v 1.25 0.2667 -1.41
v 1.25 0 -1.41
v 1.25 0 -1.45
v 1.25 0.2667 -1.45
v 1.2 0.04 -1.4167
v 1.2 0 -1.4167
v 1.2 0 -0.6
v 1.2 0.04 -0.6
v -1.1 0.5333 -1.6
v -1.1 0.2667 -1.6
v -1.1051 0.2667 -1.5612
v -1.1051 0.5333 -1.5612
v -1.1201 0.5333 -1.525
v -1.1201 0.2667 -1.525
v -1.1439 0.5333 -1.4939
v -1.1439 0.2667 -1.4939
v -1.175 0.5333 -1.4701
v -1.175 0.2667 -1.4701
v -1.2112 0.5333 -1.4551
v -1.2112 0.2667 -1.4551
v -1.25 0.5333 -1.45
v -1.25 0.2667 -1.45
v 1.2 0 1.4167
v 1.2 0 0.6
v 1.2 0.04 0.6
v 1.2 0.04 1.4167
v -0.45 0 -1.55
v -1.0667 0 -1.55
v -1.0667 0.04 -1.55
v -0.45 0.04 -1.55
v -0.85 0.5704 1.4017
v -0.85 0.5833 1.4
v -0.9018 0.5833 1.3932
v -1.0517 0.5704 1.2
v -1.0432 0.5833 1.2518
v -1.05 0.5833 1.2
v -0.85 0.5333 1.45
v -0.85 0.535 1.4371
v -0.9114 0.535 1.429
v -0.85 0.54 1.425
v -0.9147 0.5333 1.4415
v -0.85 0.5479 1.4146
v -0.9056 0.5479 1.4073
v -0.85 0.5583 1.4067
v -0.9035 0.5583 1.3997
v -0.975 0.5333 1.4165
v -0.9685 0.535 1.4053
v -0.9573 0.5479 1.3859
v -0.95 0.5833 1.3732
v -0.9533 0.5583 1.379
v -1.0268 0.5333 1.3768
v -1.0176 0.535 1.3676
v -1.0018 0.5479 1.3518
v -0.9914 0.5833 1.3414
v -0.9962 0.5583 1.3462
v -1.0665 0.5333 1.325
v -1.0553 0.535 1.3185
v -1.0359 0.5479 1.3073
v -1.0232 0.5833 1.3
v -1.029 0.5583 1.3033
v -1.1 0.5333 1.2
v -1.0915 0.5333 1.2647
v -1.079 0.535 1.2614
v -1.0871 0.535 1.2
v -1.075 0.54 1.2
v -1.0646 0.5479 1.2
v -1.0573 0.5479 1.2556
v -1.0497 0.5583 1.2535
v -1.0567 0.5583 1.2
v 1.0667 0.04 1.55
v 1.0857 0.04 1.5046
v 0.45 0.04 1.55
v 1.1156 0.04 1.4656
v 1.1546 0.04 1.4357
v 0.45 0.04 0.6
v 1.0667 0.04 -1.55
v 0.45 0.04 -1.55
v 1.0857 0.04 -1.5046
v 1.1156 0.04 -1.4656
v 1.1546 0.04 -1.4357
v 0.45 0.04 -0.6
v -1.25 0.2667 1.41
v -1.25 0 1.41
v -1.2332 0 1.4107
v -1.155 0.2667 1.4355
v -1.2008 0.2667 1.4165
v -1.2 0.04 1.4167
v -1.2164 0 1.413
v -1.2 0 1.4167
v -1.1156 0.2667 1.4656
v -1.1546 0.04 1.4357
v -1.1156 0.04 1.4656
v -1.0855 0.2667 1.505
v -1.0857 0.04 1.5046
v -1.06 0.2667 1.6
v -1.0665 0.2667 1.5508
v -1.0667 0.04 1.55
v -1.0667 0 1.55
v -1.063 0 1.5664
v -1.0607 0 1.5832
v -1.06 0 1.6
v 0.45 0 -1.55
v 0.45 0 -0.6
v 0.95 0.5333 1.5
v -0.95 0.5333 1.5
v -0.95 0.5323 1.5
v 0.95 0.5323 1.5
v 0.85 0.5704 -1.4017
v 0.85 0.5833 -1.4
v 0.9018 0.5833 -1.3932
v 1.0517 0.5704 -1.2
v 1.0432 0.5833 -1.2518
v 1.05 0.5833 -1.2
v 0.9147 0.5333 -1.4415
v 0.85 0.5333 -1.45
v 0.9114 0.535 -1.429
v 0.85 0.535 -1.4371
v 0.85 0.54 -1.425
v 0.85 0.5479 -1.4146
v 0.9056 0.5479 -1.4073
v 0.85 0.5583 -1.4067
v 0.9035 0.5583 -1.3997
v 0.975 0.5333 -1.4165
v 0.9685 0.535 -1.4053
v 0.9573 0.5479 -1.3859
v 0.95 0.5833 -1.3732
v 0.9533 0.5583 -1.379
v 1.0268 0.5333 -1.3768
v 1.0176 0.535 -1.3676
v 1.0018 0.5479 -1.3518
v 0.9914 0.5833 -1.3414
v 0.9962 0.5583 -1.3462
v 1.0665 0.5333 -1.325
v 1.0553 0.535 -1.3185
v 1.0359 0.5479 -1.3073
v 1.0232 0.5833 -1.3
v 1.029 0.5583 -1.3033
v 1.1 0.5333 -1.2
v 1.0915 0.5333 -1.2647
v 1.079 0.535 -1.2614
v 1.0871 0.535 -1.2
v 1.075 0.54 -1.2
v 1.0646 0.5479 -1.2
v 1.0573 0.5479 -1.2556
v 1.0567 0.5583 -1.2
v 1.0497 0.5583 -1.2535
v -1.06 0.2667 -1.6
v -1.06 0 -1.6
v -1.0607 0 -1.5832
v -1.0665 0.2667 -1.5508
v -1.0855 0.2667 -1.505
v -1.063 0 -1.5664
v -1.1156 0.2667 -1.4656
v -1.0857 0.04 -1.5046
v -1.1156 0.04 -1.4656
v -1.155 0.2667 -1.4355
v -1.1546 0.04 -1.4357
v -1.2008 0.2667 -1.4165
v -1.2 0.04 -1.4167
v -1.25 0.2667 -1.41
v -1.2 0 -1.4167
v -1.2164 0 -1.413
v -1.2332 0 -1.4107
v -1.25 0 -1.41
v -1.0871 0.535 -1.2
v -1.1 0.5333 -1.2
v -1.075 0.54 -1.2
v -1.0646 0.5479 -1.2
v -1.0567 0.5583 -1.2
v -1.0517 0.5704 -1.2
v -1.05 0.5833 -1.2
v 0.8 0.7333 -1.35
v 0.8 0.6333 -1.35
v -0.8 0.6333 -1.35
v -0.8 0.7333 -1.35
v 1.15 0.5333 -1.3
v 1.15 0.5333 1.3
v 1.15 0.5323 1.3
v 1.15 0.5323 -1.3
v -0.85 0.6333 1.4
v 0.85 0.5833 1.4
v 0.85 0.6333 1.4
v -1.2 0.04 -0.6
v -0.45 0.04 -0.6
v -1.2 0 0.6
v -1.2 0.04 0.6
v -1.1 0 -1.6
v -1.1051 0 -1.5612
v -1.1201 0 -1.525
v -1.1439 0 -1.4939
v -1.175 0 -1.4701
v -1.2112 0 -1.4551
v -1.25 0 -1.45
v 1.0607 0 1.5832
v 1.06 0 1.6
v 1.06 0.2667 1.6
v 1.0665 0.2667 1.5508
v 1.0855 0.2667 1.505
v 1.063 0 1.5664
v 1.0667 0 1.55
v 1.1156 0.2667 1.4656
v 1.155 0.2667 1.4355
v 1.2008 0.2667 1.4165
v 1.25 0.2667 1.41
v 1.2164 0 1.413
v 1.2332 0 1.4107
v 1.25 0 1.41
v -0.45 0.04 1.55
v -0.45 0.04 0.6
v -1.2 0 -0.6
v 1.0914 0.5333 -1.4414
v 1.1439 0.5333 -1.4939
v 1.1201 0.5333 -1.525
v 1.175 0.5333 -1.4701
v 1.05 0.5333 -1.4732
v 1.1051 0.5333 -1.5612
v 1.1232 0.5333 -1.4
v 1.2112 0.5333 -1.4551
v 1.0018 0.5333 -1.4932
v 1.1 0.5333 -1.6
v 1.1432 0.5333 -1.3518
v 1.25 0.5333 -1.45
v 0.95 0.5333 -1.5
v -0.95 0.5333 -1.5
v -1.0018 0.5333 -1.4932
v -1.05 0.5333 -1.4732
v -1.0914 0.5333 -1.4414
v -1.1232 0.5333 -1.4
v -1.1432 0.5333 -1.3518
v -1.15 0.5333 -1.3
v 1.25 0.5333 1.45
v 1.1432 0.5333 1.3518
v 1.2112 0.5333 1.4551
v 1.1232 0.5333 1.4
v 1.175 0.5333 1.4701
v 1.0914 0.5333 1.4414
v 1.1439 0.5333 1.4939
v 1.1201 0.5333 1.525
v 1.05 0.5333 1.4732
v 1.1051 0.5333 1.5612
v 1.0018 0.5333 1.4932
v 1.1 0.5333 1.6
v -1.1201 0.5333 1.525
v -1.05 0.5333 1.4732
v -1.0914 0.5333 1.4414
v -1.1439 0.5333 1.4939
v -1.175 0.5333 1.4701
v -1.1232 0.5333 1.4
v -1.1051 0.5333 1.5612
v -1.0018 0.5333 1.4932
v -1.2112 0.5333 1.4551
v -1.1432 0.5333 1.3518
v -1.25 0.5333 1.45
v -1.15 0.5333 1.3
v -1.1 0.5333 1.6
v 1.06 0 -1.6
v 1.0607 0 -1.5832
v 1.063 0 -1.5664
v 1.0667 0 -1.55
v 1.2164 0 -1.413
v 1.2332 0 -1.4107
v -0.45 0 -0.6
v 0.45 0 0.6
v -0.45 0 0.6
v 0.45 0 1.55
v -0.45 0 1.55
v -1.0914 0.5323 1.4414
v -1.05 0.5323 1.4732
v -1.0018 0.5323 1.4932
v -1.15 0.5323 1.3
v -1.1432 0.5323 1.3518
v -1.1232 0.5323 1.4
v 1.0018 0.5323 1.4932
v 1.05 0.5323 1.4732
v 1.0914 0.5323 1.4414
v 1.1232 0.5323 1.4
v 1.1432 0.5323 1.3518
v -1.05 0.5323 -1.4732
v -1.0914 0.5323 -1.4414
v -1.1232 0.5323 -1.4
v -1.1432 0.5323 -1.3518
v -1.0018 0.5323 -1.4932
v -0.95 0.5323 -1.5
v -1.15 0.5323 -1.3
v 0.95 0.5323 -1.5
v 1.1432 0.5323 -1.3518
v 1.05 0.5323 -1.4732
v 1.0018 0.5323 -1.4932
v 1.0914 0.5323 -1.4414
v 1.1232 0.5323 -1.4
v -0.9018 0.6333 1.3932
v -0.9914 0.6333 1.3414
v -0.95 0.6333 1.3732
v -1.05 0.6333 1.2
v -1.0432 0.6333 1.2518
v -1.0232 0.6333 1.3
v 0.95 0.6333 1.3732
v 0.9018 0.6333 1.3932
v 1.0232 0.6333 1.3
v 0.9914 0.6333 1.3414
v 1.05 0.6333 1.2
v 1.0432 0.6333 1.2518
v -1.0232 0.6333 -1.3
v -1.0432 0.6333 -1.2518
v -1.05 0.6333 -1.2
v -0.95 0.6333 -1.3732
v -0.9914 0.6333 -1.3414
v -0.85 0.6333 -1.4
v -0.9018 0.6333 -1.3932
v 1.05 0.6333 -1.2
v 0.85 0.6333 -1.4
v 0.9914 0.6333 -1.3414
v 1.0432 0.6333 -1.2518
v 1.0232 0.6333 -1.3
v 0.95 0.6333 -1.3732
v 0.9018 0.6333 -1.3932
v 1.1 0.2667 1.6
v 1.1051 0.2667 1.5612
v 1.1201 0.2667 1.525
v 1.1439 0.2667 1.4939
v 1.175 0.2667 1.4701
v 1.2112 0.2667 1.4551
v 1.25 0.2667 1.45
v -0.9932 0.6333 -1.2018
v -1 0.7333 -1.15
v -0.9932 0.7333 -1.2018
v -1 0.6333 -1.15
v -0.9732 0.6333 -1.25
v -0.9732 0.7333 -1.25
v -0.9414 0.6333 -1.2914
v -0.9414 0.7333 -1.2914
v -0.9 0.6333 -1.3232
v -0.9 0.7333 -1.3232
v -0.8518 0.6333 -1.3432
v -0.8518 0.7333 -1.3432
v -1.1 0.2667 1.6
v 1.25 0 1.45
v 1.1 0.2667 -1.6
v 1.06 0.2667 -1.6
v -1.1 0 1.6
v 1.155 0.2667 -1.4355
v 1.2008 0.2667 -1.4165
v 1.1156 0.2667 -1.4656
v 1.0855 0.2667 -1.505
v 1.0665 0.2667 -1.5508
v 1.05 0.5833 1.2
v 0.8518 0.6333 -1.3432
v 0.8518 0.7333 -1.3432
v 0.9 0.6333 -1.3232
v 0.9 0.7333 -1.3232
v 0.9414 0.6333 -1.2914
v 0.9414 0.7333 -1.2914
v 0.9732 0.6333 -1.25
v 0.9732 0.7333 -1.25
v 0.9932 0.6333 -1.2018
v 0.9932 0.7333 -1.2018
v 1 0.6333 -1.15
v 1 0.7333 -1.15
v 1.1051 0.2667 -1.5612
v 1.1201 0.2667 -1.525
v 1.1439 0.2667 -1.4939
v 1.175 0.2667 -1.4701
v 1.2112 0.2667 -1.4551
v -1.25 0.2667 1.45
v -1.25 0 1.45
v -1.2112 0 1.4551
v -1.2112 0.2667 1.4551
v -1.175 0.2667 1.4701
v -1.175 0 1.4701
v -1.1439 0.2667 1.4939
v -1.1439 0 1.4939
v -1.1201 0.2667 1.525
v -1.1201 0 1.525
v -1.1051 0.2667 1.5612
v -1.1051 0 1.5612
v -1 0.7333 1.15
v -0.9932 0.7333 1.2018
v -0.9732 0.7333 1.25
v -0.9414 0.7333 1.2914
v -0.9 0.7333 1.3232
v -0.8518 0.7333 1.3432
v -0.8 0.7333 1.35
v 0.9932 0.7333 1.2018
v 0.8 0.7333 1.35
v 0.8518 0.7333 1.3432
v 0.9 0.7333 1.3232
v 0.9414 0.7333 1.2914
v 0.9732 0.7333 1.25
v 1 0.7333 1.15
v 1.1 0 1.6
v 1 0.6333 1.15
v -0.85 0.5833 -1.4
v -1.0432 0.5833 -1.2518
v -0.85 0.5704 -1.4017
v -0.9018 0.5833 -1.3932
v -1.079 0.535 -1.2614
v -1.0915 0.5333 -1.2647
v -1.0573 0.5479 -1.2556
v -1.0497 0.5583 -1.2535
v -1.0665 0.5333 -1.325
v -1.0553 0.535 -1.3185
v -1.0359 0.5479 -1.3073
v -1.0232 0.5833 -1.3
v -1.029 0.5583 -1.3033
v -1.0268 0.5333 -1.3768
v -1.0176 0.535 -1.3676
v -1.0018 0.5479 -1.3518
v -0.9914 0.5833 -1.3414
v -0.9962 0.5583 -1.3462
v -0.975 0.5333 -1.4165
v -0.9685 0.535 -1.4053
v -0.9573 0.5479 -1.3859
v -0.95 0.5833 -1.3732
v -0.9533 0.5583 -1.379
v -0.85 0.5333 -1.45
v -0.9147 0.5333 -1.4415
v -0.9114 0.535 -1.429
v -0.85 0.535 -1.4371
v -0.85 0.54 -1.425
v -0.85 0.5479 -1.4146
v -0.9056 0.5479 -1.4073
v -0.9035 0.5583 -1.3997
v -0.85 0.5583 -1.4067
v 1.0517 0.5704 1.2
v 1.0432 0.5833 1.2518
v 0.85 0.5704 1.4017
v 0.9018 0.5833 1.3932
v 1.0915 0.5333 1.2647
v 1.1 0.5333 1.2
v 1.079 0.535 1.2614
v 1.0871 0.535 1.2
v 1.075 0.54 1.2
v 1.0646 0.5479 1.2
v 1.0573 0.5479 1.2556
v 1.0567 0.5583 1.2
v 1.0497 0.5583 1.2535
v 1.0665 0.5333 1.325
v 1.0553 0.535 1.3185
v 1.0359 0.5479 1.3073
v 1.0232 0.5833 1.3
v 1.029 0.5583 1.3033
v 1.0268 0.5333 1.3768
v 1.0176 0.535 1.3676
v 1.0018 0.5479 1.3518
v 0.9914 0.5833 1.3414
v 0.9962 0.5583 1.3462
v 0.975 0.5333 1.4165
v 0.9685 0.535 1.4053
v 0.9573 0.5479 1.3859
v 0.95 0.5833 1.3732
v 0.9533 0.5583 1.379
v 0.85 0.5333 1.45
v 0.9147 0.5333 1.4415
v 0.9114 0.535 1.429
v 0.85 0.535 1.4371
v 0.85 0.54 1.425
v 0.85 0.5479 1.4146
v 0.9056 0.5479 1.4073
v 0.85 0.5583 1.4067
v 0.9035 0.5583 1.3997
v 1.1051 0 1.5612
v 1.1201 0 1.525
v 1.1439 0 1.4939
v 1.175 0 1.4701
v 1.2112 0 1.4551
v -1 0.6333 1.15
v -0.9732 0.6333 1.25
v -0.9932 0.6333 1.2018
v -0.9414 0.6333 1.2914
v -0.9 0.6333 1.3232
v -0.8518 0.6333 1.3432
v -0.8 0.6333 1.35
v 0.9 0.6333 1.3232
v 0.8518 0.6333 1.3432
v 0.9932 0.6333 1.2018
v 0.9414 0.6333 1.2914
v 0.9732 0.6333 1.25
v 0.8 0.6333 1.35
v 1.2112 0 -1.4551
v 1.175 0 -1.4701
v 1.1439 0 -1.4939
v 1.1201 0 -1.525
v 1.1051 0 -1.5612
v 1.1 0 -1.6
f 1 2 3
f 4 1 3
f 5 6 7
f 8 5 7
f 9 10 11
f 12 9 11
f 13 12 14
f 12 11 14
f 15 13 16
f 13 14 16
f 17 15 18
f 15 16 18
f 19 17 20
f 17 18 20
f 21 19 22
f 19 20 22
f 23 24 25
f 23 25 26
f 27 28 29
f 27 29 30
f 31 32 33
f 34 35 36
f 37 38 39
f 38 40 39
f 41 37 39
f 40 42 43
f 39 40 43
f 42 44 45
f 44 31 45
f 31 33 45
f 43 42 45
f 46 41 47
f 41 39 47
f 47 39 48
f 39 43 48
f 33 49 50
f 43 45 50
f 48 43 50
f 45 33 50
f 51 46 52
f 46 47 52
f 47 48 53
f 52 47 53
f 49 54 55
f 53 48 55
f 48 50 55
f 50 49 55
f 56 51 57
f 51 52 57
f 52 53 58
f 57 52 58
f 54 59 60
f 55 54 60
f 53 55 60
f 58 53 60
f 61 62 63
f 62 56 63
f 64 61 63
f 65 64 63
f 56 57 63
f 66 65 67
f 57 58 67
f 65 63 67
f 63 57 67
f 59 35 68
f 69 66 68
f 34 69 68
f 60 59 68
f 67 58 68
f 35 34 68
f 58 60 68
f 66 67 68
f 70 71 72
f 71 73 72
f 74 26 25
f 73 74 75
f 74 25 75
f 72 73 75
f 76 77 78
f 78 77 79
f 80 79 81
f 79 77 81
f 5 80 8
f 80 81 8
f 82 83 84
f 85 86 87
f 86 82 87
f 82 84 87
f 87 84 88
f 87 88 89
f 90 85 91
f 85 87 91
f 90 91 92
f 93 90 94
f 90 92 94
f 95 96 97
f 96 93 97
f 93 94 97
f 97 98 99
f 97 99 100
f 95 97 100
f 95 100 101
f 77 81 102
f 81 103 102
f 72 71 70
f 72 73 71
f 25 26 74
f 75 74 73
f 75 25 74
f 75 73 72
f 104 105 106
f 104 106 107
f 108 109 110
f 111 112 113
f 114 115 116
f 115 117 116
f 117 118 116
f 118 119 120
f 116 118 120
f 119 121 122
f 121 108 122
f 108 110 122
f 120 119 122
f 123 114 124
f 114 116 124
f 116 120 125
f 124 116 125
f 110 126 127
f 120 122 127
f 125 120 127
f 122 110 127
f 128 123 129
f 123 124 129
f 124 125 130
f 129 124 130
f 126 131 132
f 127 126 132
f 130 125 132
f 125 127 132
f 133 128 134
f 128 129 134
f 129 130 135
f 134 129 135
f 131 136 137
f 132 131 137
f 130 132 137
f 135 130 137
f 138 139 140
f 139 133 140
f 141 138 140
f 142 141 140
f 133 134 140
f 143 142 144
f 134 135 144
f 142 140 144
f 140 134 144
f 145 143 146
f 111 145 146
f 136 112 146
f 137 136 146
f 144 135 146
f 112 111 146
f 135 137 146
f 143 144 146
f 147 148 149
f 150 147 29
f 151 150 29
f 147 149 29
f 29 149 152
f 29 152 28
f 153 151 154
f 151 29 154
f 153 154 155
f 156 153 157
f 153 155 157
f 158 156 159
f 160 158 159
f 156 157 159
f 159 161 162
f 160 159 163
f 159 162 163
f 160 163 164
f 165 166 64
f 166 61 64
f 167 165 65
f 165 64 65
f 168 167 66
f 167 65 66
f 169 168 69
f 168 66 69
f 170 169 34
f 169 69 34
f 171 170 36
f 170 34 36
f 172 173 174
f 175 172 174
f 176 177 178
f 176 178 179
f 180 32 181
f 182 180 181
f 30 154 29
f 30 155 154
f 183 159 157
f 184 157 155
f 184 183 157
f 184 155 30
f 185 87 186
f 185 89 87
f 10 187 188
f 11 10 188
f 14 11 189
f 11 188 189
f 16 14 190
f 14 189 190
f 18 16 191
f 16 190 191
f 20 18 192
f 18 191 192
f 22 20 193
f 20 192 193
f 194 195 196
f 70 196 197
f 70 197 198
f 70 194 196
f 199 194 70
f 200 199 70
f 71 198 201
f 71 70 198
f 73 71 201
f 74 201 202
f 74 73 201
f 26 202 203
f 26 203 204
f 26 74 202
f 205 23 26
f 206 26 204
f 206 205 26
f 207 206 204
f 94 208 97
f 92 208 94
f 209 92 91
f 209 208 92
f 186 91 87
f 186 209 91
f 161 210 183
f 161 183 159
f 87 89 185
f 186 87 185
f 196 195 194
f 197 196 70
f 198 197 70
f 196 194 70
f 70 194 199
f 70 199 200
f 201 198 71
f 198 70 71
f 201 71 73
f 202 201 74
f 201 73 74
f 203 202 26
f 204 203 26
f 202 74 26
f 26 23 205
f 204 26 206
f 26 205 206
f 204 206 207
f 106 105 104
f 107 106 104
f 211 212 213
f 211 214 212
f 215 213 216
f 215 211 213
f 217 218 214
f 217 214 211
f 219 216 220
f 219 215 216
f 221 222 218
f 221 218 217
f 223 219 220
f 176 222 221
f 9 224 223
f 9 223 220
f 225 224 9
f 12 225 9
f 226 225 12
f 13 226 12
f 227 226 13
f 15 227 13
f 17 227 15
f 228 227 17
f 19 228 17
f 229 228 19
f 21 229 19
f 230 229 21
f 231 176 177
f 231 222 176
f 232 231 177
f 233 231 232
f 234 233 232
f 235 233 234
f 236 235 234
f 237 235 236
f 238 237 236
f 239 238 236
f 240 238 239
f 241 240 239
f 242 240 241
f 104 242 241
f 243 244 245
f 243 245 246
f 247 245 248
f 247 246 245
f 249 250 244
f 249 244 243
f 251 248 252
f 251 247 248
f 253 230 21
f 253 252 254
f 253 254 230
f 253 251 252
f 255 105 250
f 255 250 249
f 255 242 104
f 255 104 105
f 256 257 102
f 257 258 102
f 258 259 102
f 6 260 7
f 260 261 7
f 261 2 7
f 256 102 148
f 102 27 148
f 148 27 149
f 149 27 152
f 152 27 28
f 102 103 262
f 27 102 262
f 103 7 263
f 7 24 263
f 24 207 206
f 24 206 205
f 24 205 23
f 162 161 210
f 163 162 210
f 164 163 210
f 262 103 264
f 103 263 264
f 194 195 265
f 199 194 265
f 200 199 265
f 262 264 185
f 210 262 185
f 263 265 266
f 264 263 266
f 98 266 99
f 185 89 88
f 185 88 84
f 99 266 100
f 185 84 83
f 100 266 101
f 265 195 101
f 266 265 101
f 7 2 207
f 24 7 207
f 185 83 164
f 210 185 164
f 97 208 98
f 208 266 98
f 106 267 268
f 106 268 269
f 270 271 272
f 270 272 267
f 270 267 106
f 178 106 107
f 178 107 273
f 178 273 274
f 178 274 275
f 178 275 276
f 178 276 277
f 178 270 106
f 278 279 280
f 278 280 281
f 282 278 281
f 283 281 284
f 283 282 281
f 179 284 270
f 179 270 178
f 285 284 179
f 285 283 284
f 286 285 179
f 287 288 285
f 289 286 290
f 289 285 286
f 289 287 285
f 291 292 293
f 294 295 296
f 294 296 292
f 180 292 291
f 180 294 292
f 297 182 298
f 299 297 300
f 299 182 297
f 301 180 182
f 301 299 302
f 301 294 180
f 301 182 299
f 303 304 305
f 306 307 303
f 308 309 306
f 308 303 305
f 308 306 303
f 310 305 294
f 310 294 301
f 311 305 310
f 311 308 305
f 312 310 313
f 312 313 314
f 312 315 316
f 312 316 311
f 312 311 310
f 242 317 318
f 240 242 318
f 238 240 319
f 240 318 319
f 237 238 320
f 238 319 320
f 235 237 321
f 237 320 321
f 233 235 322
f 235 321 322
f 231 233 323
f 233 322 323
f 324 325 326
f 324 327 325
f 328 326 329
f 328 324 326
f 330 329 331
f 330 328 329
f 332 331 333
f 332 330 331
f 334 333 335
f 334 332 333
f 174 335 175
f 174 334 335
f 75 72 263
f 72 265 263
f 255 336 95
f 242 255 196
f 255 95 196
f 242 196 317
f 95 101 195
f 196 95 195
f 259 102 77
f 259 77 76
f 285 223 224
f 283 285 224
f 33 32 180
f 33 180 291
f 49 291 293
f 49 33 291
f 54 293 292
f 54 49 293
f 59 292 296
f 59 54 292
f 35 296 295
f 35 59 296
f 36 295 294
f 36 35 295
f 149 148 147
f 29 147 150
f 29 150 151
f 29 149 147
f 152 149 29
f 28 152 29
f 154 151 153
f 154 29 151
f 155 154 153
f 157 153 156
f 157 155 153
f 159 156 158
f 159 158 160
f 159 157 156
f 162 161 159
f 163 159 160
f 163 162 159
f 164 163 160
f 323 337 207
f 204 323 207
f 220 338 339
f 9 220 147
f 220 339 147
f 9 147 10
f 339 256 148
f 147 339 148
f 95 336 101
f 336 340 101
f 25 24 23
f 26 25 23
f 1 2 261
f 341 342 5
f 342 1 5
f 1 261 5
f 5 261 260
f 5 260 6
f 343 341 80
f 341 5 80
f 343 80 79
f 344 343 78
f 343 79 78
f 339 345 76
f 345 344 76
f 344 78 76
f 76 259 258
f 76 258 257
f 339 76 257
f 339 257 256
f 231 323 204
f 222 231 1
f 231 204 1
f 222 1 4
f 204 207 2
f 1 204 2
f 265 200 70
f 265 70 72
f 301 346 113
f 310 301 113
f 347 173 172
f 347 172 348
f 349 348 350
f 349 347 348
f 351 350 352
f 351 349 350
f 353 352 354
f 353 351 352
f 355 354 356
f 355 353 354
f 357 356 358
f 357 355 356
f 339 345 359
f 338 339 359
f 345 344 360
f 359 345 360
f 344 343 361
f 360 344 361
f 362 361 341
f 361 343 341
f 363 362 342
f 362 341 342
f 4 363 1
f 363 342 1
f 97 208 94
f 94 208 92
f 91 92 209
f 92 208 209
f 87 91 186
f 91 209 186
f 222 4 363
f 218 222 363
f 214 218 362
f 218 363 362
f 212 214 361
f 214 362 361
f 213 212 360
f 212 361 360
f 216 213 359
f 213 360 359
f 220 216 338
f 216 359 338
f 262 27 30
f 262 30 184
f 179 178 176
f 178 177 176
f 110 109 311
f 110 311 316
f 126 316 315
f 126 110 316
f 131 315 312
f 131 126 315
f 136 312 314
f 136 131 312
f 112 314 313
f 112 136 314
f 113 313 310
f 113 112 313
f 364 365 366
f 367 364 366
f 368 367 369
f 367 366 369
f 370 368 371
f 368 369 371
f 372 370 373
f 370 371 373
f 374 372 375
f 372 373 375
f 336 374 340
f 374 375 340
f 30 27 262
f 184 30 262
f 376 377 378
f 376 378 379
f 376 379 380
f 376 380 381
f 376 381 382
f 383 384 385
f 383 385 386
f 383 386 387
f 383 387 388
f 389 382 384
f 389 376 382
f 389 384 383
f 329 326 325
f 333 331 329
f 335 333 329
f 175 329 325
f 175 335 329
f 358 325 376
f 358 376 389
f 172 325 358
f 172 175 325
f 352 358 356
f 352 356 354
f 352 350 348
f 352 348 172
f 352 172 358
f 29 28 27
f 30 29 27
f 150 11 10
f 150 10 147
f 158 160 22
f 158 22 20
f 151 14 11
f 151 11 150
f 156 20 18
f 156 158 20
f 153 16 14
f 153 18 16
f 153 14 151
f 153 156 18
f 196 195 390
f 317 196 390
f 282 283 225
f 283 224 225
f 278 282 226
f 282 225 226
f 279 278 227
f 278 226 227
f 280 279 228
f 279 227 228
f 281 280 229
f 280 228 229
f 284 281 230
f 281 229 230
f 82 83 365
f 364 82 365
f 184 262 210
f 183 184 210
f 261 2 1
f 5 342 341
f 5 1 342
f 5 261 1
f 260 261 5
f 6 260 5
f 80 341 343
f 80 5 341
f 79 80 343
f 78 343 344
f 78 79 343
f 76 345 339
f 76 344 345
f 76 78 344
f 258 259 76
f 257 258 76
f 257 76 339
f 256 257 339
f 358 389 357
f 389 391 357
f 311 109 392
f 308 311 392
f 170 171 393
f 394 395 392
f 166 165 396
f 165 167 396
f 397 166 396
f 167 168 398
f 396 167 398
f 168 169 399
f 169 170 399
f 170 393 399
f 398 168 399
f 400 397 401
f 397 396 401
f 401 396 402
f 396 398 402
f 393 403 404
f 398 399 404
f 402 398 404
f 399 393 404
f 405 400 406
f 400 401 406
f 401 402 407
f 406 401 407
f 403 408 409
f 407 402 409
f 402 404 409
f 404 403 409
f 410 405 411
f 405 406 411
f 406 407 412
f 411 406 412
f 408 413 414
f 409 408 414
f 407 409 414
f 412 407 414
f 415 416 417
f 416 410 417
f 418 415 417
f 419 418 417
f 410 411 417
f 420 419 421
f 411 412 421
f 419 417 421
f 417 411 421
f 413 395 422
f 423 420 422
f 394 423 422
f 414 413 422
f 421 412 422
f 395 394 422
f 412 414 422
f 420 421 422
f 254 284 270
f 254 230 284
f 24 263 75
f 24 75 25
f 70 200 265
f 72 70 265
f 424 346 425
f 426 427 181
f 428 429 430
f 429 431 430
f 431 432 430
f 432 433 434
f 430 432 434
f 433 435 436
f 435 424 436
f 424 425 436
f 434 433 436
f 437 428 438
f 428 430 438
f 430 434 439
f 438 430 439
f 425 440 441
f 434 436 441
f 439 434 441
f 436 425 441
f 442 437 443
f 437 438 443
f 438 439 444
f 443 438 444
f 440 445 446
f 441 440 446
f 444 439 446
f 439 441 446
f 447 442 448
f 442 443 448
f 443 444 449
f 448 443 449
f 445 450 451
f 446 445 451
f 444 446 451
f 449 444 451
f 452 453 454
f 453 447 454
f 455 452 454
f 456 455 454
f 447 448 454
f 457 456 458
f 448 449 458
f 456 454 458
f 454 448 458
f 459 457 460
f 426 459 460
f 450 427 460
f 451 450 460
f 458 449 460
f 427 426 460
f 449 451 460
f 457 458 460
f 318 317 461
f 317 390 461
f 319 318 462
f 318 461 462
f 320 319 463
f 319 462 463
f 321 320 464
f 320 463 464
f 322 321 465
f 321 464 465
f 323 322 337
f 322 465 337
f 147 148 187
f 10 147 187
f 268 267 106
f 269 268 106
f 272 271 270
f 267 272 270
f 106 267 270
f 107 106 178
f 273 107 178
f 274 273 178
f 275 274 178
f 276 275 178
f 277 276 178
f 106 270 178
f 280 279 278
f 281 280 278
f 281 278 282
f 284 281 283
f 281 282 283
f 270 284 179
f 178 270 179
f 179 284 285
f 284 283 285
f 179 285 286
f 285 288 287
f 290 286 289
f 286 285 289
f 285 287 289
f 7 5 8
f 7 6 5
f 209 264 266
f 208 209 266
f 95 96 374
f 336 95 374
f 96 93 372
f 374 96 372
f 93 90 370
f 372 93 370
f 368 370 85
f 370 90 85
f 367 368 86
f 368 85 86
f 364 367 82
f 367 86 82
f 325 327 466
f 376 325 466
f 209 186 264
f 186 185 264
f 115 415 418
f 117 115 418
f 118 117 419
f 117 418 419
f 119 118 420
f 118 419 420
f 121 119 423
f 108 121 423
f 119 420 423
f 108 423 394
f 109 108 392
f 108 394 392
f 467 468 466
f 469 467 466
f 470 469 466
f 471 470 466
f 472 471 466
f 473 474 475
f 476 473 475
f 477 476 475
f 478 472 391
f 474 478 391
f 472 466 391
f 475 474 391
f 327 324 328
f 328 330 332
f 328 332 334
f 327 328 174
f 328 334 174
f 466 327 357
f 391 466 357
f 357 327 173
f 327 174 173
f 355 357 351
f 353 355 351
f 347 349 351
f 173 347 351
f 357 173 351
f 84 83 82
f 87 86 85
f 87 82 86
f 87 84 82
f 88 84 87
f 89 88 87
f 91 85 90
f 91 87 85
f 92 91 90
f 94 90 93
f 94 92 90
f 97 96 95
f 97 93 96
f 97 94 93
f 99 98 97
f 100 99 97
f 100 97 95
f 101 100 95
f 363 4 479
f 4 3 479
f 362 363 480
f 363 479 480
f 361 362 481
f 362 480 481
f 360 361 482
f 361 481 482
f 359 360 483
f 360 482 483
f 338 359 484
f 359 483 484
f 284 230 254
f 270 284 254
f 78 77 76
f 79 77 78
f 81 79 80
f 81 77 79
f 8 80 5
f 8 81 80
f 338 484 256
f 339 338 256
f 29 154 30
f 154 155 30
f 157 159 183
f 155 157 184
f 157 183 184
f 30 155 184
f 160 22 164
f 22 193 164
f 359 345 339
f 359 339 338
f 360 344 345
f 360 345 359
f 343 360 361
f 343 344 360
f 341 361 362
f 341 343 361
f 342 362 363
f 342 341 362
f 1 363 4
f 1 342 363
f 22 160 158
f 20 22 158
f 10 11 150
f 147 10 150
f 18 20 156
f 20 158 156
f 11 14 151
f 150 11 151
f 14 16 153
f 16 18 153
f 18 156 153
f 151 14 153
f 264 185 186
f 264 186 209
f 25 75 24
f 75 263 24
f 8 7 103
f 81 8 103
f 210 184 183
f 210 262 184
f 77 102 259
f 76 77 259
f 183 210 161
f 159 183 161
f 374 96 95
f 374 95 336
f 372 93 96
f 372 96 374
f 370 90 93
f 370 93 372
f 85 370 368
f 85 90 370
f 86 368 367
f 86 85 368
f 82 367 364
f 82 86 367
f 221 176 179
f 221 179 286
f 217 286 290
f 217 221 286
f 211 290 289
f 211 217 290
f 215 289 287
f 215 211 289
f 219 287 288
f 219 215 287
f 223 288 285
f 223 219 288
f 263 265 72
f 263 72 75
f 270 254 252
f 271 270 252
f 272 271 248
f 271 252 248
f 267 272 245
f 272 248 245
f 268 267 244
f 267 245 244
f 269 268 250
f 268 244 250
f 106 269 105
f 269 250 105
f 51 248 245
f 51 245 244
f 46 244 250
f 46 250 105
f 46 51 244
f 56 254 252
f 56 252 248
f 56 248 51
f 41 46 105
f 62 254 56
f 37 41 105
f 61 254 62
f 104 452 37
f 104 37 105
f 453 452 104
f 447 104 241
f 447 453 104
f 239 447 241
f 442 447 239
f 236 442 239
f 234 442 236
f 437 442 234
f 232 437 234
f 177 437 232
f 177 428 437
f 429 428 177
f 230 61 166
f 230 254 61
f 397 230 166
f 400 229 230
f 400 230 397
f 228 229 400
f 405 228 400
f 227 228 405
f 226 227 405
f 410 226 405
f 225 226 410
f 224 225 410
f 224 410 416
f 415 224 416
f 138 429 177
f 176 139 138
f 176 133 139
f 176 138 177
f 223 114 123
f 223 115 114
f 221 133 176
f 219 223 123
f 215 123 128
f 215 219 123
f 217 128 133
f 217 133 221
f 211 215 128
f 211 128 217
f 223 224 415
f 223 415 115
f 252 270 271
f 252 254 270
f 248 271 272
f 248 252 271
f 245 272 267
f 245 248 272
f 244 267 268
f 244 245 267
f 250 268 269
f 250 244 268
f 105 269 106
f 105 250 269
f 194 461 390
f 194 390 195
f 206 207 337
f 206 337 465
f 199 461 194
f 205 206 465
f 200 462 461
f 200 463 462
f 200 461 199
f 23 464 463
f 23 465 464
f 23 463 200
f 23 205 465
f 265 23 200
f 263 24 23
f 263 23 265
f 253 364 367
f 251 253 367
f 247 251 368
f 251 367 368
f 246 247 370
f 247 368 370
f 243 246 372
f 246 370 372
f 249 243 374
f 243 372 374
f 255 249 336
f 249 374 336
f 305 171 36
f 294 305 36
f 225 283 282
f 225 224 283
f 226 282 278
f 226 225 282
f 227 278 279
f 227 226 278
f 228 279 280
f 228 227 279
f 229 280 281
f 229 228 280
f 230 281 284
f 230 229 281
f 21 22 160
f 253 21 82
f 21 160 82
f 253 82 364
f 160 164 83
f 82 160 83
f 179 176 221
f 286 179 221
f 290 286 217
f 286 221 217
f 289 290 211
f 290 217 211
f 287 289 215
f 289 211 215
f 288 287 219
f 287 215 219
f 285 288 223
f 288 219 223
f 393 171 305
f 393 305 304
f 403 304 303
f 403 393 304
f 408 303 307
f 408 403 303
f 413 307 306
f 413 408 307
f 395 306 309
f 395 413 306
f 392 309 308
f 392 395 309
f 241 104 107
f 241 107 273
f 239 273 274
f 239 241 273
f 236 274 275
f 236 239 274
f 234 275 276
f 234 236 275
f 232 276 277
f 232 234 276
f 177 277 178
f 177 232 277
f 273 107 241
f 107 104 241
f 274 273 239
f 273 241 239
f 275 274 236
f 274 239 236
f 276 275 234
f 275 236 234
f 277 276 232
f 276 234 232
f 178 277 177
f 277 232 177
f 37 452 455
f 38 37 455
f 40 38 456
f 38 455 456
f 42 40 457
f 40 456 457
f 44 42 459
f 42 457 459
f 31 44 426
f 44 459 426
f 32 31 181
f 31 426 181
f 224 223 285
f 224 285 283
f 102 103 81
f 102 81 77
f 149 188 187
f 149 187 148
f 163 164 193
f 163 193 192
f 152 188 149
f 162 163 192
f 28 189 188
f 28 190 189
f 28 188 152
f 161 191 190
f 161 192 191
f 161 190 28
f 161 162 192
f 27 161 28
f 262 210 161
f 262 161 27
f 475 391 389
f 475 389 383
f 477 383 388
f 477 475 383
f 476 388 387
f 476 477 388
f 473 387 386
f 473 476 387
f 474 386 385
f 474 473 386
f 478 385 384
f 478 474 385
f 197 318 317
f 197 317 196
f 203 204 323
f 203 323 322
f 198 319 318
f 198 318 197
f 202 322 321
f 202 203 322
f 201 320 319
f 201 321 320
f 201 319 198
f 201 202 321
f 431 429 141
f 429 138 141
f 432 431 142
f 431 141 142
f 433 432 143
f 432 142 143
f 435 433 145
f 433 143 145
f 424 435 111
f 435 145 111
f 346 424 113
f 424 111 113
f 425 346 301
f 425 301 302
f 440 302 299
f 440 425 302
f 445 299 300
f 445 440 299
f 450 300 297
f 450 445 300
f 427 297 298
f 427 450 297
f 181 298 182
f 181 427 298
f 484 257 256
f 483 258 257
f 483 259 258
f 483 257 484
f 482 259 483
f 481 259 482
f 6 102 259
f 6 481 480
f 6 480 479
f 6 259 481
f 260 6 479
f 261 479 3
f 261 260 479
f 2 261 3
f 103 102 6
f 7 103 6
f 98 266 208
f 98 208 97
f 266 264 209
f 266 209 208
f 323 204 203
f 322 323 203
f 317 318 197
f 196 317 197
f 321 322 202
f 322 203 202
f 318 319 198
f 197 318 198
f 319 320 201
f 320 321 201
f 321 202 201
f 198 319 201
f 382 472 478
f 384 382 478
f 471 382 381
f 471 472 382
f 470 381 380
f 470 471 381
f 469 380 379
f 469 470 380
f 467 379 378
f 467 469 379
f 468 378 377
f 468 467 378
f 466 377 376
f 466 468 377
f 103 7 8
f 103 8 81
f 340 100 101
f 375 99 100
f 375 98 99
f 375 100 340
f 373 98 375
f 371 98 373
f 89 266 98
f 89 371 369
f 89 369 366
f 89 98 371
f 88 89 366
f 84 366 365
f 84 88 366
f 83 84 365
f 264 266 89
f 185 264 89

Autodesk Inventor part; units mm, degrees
ref_plane "YZ Plane" through (0, 0, 0) normal (1, 0, 0) x (0, 1, 0)
ref_plane "XZ Plane" through (0, 0, 0) normal (0, 1, 0) x (-1, 0, 0)
ref_plane "XY Plane" through (0, 0, 0) normal (0, 0, 1) x (1, 0, 0)
sketch "Sketch1" plane through (0, 0, 0) normal (0, 1, 0) x (-1, 0, 0)
  line L0 (1.1, 1.6) -> (-1.1, 1.6)
  line L1 (-1.25, 1.45) -> (-1.25, -1.45)
  line L2 (-1.1, -1.6) -> (1.1, -1.6)
  line L3 (1.25, -1.45) -> (1.25, 1.45)
  arc A0 (1.25, -1.45) -> (1.1, -1.6) centre (1.25, -1.6) ccw
  arc A1 (1.1, 1.6) -> (1.25, 1.45) centre (1.25, 1.6) ccw
  arc A2 (-1.1, -1.6) -> (-1.25, -1.45) centre (-1.25, -1.6) ccw
  arc A3 (-1.25, 1.45) -> (-1.1, 1.6) centre (-1.25, 1.6) ccw
  point P0 (0, 0)
  point P1 (1.25, 0)
  point P2 (-1.25, 0)
  point P3 (0, 1.6)
  point P4 (0, -1.6)
  dimension "d2" = 3.2
  dimension "d3" = 2.5
  dimension "d4" = 0.15
extrude "Extrusion1" add sketch "Sketch1" along normal blind 0.5333
sketch "Sketch3" plane through (0, 0.5333, 0) normal (0, 1, 0) x (1, 0, 0)
  line L0 (0.95, 1.5) -> (-0.95, 1.5)
  line L1 (-1.15, 1.3) -> (-1.15, -1.3)
  line L2 (-0.95, -1.5) -> (0.95, -1.5)
  line L3 (1.15, -1.3) -> (1.15, 1.3)
  arc A0 (1.15, 1.3) -> (0.95, 1.5) centre (0.95, 1.3) ccw
  arc A1 (-0.95, 1.5) -> (-1.15, 1.3) centre (-0.95, 1.3) ccw
  arc A2 (-1.15, -1.3) -> (-0.95, -1.5) centre (-0.95, -1.3) ccw
  arc A3 (0.95, -1.5) -> (1.15, -1.3) centre (0.95, -1.3) ccw
  point P0 (0, 0)
  point P1 (0, 0)
  point P2 (0, 1.5)
  point P3 (1.15, 0)
  dimension "d12" = 3
  dimension "d13" = 2.3
  dimension "d14" = 0.2
extrude "Extrusion7" cut sketch "Sketch3" against normal blind 0.001
extrude "Extrusion3" add sketch "Sketch3" against normal blind 0.001 separate body
sketch "Sketch2" plane through (0, 0.5333, 0) normal (0, 1, 0) x (1, 0, 0)
  line L0 (0.85, 1.4) -> (-0.85, 1.4)
  line L1 (-1.05, 1.2) -> (-1.05, -1.2)
  line L2 (-0.85, -1.4) -> (0.85, -1.4)
  line L3 (1.05, -1.2) -> (1.05, 1.2)
  arc A0 (1.05, 1.2) -> (0.85, 1.4) centre (0.85, 1.2) ccw
  arc A1 (-0.85, 1.4) -> (-1.05, 1.2) centre (-0.85, 1.2) ccw
  arc A2 (-1.05, -1.2) -> (-0.85, -1.4) centre (-0.85, -1.2) ccw
  arc A3 (0.85, -1.4) -> (1.05, -1.2) centre (0.85, -1.2) ccw
  point P0 (0, 0)
  point P1 (0, 1.4)
  point P2 (1.05, 0)
  dimension "d7" = 2.8
  dimension "d8" = 2.1
  dimension "d9" = 0.2
extrude "Extrusion2" add sketch "Sketch2" along normal blind 0.1 bodies 2
sketch "Sketch4" plane through (0, 0.6333, 0) normal (0, 1, 0) x (1, 0, 0)
  line L0 (0.8, 1.35) -> (-0.8, 1.35)
  line L1 (-1, 1.15) -> (-1, -1.15)
  line L2 (-0.8, -1.35) -> (0.8, -1.35)
  line L3 (1, -1.15) -> (1, 1.15)
  arc A0 (1, 1.15) -> (0.8, 1.35) centre (0.8, 1.15) ccw
  arc A1 (-0.8, 1.35) -> (-1, 1.15) centre (-0.8, 1.15) ccw
  arc A2 (-1, -1.15) -> (-0.8, -1.35) centre (-0.8, -1.15) ccw
  arc A3 (0.8, -1.35) -> (1, -1.15) centre (0.8, -1.15) ccw
  point P0 (0, 0)
  point P1 (0, 0)
  point P2 (0, 1.35)
  point P3 (1, 0)
  dimension "d17" = 2.7
  dimension "d18" = 2
  dimension "d19" = 0.2
extrude "Extrusion4" add sketch "Sketch4" along normal blind 0.1 separate body
fillet "Fillet1" radius 0.05 8 edges at (-0.9914, 0.5333, -1.3414) (0, 0.5333, -1.4) (0.9914, 0.5333, -1.3414) (1.05, 0.5333, 0) (0.9914, 0.5333, 1.3414) (0, 0.5333, 1.4) (-0.9914, 0.5333, 1.3414) (-1.05, 0.5333, 0)
sketch "Sketch5" plane through (0, 0, 0) normal (0, -1, 0) x (1, 0, 0)
  arc A0 (-1.06, -1.6) -> (-1.25, -1.41) centre (-1.25, -1.6) ccw
  arc A1 (-1.1, -1.6) -> (-1.25, -1.45) centre (-1.25, -1.6) ccw projected
  line L0 (-1.25, -1.45) -> (-1.25, 1.45) projected
  line L1 (1.1, -1.6) -> (-1.1, -1.6) projected
  point P0 (0, 0)
  dimension "d23" = 0.38
extrude "Extrusion10" cut sketch "Sketch5" against normal blind 0.2667 bodies 1
sketch "Sketch6" plane through (0, 0, 0) normal (0, -1, 0) x (1, 0, 0)
  line L0 (-0.45, -0.6) -> (-1.2, -0.6)
  line L1 (-1.2, -0.6) -> (-1.2, -1.4167)
  line L2 (-1.0667, -1.55) -> (-0.45, -1.55)
  line L3 (-0.45, -1.55) -> (-0.45, -0.6)
  line L4 (1.1, -1.6) -> (-1.1, -1.6) projected
  line L5 (-1.25, -1.45) -> (-1.25, 1.45) projected
  arc A0 (-1.06, -1.6) -> (-1.25, -1.41) centre (-1.25, -1.6) ccw projected
  point P0 (0, 0)
  dimension "d26" = 1
  dimension "d27" = 0.8
  dimension "d28" = 0.05
  dimension "d29" = 0.05
extrude "Extrusion11" cut sketch "Sketch6" against normal blind 0.04 bodies 1
mirror "Mirror4" about plane through (0, 0, 0) normal (0, 0, 1) of "Extrusion10", "Extrusion11" bodies 1
mirror "Mirror5" about plane through (0, 0, 0) normal (1, 0, 0) of "Extrusion10", "Extrusion11", "Mirror4" bodies 1
extrude "Extrusion12" add sketch "Sketch6" against normal blind 0.04 separate body
extrude "Extrusion13" add sketch "Sketch5" against normal blind 0.2667 bodies 4
mirror "Mirror6" about plane through (0, 0, 0) normal (1, 0, 0) of "Extrusion12", "Extrusion13" bodies 4
mirror "Mirror7" about plane through (0, 0, 0) normal (0, 0, 1) of "Mirror6", "Extrusion13", "Extrusion12" bodies 4
properties part number "403C"
